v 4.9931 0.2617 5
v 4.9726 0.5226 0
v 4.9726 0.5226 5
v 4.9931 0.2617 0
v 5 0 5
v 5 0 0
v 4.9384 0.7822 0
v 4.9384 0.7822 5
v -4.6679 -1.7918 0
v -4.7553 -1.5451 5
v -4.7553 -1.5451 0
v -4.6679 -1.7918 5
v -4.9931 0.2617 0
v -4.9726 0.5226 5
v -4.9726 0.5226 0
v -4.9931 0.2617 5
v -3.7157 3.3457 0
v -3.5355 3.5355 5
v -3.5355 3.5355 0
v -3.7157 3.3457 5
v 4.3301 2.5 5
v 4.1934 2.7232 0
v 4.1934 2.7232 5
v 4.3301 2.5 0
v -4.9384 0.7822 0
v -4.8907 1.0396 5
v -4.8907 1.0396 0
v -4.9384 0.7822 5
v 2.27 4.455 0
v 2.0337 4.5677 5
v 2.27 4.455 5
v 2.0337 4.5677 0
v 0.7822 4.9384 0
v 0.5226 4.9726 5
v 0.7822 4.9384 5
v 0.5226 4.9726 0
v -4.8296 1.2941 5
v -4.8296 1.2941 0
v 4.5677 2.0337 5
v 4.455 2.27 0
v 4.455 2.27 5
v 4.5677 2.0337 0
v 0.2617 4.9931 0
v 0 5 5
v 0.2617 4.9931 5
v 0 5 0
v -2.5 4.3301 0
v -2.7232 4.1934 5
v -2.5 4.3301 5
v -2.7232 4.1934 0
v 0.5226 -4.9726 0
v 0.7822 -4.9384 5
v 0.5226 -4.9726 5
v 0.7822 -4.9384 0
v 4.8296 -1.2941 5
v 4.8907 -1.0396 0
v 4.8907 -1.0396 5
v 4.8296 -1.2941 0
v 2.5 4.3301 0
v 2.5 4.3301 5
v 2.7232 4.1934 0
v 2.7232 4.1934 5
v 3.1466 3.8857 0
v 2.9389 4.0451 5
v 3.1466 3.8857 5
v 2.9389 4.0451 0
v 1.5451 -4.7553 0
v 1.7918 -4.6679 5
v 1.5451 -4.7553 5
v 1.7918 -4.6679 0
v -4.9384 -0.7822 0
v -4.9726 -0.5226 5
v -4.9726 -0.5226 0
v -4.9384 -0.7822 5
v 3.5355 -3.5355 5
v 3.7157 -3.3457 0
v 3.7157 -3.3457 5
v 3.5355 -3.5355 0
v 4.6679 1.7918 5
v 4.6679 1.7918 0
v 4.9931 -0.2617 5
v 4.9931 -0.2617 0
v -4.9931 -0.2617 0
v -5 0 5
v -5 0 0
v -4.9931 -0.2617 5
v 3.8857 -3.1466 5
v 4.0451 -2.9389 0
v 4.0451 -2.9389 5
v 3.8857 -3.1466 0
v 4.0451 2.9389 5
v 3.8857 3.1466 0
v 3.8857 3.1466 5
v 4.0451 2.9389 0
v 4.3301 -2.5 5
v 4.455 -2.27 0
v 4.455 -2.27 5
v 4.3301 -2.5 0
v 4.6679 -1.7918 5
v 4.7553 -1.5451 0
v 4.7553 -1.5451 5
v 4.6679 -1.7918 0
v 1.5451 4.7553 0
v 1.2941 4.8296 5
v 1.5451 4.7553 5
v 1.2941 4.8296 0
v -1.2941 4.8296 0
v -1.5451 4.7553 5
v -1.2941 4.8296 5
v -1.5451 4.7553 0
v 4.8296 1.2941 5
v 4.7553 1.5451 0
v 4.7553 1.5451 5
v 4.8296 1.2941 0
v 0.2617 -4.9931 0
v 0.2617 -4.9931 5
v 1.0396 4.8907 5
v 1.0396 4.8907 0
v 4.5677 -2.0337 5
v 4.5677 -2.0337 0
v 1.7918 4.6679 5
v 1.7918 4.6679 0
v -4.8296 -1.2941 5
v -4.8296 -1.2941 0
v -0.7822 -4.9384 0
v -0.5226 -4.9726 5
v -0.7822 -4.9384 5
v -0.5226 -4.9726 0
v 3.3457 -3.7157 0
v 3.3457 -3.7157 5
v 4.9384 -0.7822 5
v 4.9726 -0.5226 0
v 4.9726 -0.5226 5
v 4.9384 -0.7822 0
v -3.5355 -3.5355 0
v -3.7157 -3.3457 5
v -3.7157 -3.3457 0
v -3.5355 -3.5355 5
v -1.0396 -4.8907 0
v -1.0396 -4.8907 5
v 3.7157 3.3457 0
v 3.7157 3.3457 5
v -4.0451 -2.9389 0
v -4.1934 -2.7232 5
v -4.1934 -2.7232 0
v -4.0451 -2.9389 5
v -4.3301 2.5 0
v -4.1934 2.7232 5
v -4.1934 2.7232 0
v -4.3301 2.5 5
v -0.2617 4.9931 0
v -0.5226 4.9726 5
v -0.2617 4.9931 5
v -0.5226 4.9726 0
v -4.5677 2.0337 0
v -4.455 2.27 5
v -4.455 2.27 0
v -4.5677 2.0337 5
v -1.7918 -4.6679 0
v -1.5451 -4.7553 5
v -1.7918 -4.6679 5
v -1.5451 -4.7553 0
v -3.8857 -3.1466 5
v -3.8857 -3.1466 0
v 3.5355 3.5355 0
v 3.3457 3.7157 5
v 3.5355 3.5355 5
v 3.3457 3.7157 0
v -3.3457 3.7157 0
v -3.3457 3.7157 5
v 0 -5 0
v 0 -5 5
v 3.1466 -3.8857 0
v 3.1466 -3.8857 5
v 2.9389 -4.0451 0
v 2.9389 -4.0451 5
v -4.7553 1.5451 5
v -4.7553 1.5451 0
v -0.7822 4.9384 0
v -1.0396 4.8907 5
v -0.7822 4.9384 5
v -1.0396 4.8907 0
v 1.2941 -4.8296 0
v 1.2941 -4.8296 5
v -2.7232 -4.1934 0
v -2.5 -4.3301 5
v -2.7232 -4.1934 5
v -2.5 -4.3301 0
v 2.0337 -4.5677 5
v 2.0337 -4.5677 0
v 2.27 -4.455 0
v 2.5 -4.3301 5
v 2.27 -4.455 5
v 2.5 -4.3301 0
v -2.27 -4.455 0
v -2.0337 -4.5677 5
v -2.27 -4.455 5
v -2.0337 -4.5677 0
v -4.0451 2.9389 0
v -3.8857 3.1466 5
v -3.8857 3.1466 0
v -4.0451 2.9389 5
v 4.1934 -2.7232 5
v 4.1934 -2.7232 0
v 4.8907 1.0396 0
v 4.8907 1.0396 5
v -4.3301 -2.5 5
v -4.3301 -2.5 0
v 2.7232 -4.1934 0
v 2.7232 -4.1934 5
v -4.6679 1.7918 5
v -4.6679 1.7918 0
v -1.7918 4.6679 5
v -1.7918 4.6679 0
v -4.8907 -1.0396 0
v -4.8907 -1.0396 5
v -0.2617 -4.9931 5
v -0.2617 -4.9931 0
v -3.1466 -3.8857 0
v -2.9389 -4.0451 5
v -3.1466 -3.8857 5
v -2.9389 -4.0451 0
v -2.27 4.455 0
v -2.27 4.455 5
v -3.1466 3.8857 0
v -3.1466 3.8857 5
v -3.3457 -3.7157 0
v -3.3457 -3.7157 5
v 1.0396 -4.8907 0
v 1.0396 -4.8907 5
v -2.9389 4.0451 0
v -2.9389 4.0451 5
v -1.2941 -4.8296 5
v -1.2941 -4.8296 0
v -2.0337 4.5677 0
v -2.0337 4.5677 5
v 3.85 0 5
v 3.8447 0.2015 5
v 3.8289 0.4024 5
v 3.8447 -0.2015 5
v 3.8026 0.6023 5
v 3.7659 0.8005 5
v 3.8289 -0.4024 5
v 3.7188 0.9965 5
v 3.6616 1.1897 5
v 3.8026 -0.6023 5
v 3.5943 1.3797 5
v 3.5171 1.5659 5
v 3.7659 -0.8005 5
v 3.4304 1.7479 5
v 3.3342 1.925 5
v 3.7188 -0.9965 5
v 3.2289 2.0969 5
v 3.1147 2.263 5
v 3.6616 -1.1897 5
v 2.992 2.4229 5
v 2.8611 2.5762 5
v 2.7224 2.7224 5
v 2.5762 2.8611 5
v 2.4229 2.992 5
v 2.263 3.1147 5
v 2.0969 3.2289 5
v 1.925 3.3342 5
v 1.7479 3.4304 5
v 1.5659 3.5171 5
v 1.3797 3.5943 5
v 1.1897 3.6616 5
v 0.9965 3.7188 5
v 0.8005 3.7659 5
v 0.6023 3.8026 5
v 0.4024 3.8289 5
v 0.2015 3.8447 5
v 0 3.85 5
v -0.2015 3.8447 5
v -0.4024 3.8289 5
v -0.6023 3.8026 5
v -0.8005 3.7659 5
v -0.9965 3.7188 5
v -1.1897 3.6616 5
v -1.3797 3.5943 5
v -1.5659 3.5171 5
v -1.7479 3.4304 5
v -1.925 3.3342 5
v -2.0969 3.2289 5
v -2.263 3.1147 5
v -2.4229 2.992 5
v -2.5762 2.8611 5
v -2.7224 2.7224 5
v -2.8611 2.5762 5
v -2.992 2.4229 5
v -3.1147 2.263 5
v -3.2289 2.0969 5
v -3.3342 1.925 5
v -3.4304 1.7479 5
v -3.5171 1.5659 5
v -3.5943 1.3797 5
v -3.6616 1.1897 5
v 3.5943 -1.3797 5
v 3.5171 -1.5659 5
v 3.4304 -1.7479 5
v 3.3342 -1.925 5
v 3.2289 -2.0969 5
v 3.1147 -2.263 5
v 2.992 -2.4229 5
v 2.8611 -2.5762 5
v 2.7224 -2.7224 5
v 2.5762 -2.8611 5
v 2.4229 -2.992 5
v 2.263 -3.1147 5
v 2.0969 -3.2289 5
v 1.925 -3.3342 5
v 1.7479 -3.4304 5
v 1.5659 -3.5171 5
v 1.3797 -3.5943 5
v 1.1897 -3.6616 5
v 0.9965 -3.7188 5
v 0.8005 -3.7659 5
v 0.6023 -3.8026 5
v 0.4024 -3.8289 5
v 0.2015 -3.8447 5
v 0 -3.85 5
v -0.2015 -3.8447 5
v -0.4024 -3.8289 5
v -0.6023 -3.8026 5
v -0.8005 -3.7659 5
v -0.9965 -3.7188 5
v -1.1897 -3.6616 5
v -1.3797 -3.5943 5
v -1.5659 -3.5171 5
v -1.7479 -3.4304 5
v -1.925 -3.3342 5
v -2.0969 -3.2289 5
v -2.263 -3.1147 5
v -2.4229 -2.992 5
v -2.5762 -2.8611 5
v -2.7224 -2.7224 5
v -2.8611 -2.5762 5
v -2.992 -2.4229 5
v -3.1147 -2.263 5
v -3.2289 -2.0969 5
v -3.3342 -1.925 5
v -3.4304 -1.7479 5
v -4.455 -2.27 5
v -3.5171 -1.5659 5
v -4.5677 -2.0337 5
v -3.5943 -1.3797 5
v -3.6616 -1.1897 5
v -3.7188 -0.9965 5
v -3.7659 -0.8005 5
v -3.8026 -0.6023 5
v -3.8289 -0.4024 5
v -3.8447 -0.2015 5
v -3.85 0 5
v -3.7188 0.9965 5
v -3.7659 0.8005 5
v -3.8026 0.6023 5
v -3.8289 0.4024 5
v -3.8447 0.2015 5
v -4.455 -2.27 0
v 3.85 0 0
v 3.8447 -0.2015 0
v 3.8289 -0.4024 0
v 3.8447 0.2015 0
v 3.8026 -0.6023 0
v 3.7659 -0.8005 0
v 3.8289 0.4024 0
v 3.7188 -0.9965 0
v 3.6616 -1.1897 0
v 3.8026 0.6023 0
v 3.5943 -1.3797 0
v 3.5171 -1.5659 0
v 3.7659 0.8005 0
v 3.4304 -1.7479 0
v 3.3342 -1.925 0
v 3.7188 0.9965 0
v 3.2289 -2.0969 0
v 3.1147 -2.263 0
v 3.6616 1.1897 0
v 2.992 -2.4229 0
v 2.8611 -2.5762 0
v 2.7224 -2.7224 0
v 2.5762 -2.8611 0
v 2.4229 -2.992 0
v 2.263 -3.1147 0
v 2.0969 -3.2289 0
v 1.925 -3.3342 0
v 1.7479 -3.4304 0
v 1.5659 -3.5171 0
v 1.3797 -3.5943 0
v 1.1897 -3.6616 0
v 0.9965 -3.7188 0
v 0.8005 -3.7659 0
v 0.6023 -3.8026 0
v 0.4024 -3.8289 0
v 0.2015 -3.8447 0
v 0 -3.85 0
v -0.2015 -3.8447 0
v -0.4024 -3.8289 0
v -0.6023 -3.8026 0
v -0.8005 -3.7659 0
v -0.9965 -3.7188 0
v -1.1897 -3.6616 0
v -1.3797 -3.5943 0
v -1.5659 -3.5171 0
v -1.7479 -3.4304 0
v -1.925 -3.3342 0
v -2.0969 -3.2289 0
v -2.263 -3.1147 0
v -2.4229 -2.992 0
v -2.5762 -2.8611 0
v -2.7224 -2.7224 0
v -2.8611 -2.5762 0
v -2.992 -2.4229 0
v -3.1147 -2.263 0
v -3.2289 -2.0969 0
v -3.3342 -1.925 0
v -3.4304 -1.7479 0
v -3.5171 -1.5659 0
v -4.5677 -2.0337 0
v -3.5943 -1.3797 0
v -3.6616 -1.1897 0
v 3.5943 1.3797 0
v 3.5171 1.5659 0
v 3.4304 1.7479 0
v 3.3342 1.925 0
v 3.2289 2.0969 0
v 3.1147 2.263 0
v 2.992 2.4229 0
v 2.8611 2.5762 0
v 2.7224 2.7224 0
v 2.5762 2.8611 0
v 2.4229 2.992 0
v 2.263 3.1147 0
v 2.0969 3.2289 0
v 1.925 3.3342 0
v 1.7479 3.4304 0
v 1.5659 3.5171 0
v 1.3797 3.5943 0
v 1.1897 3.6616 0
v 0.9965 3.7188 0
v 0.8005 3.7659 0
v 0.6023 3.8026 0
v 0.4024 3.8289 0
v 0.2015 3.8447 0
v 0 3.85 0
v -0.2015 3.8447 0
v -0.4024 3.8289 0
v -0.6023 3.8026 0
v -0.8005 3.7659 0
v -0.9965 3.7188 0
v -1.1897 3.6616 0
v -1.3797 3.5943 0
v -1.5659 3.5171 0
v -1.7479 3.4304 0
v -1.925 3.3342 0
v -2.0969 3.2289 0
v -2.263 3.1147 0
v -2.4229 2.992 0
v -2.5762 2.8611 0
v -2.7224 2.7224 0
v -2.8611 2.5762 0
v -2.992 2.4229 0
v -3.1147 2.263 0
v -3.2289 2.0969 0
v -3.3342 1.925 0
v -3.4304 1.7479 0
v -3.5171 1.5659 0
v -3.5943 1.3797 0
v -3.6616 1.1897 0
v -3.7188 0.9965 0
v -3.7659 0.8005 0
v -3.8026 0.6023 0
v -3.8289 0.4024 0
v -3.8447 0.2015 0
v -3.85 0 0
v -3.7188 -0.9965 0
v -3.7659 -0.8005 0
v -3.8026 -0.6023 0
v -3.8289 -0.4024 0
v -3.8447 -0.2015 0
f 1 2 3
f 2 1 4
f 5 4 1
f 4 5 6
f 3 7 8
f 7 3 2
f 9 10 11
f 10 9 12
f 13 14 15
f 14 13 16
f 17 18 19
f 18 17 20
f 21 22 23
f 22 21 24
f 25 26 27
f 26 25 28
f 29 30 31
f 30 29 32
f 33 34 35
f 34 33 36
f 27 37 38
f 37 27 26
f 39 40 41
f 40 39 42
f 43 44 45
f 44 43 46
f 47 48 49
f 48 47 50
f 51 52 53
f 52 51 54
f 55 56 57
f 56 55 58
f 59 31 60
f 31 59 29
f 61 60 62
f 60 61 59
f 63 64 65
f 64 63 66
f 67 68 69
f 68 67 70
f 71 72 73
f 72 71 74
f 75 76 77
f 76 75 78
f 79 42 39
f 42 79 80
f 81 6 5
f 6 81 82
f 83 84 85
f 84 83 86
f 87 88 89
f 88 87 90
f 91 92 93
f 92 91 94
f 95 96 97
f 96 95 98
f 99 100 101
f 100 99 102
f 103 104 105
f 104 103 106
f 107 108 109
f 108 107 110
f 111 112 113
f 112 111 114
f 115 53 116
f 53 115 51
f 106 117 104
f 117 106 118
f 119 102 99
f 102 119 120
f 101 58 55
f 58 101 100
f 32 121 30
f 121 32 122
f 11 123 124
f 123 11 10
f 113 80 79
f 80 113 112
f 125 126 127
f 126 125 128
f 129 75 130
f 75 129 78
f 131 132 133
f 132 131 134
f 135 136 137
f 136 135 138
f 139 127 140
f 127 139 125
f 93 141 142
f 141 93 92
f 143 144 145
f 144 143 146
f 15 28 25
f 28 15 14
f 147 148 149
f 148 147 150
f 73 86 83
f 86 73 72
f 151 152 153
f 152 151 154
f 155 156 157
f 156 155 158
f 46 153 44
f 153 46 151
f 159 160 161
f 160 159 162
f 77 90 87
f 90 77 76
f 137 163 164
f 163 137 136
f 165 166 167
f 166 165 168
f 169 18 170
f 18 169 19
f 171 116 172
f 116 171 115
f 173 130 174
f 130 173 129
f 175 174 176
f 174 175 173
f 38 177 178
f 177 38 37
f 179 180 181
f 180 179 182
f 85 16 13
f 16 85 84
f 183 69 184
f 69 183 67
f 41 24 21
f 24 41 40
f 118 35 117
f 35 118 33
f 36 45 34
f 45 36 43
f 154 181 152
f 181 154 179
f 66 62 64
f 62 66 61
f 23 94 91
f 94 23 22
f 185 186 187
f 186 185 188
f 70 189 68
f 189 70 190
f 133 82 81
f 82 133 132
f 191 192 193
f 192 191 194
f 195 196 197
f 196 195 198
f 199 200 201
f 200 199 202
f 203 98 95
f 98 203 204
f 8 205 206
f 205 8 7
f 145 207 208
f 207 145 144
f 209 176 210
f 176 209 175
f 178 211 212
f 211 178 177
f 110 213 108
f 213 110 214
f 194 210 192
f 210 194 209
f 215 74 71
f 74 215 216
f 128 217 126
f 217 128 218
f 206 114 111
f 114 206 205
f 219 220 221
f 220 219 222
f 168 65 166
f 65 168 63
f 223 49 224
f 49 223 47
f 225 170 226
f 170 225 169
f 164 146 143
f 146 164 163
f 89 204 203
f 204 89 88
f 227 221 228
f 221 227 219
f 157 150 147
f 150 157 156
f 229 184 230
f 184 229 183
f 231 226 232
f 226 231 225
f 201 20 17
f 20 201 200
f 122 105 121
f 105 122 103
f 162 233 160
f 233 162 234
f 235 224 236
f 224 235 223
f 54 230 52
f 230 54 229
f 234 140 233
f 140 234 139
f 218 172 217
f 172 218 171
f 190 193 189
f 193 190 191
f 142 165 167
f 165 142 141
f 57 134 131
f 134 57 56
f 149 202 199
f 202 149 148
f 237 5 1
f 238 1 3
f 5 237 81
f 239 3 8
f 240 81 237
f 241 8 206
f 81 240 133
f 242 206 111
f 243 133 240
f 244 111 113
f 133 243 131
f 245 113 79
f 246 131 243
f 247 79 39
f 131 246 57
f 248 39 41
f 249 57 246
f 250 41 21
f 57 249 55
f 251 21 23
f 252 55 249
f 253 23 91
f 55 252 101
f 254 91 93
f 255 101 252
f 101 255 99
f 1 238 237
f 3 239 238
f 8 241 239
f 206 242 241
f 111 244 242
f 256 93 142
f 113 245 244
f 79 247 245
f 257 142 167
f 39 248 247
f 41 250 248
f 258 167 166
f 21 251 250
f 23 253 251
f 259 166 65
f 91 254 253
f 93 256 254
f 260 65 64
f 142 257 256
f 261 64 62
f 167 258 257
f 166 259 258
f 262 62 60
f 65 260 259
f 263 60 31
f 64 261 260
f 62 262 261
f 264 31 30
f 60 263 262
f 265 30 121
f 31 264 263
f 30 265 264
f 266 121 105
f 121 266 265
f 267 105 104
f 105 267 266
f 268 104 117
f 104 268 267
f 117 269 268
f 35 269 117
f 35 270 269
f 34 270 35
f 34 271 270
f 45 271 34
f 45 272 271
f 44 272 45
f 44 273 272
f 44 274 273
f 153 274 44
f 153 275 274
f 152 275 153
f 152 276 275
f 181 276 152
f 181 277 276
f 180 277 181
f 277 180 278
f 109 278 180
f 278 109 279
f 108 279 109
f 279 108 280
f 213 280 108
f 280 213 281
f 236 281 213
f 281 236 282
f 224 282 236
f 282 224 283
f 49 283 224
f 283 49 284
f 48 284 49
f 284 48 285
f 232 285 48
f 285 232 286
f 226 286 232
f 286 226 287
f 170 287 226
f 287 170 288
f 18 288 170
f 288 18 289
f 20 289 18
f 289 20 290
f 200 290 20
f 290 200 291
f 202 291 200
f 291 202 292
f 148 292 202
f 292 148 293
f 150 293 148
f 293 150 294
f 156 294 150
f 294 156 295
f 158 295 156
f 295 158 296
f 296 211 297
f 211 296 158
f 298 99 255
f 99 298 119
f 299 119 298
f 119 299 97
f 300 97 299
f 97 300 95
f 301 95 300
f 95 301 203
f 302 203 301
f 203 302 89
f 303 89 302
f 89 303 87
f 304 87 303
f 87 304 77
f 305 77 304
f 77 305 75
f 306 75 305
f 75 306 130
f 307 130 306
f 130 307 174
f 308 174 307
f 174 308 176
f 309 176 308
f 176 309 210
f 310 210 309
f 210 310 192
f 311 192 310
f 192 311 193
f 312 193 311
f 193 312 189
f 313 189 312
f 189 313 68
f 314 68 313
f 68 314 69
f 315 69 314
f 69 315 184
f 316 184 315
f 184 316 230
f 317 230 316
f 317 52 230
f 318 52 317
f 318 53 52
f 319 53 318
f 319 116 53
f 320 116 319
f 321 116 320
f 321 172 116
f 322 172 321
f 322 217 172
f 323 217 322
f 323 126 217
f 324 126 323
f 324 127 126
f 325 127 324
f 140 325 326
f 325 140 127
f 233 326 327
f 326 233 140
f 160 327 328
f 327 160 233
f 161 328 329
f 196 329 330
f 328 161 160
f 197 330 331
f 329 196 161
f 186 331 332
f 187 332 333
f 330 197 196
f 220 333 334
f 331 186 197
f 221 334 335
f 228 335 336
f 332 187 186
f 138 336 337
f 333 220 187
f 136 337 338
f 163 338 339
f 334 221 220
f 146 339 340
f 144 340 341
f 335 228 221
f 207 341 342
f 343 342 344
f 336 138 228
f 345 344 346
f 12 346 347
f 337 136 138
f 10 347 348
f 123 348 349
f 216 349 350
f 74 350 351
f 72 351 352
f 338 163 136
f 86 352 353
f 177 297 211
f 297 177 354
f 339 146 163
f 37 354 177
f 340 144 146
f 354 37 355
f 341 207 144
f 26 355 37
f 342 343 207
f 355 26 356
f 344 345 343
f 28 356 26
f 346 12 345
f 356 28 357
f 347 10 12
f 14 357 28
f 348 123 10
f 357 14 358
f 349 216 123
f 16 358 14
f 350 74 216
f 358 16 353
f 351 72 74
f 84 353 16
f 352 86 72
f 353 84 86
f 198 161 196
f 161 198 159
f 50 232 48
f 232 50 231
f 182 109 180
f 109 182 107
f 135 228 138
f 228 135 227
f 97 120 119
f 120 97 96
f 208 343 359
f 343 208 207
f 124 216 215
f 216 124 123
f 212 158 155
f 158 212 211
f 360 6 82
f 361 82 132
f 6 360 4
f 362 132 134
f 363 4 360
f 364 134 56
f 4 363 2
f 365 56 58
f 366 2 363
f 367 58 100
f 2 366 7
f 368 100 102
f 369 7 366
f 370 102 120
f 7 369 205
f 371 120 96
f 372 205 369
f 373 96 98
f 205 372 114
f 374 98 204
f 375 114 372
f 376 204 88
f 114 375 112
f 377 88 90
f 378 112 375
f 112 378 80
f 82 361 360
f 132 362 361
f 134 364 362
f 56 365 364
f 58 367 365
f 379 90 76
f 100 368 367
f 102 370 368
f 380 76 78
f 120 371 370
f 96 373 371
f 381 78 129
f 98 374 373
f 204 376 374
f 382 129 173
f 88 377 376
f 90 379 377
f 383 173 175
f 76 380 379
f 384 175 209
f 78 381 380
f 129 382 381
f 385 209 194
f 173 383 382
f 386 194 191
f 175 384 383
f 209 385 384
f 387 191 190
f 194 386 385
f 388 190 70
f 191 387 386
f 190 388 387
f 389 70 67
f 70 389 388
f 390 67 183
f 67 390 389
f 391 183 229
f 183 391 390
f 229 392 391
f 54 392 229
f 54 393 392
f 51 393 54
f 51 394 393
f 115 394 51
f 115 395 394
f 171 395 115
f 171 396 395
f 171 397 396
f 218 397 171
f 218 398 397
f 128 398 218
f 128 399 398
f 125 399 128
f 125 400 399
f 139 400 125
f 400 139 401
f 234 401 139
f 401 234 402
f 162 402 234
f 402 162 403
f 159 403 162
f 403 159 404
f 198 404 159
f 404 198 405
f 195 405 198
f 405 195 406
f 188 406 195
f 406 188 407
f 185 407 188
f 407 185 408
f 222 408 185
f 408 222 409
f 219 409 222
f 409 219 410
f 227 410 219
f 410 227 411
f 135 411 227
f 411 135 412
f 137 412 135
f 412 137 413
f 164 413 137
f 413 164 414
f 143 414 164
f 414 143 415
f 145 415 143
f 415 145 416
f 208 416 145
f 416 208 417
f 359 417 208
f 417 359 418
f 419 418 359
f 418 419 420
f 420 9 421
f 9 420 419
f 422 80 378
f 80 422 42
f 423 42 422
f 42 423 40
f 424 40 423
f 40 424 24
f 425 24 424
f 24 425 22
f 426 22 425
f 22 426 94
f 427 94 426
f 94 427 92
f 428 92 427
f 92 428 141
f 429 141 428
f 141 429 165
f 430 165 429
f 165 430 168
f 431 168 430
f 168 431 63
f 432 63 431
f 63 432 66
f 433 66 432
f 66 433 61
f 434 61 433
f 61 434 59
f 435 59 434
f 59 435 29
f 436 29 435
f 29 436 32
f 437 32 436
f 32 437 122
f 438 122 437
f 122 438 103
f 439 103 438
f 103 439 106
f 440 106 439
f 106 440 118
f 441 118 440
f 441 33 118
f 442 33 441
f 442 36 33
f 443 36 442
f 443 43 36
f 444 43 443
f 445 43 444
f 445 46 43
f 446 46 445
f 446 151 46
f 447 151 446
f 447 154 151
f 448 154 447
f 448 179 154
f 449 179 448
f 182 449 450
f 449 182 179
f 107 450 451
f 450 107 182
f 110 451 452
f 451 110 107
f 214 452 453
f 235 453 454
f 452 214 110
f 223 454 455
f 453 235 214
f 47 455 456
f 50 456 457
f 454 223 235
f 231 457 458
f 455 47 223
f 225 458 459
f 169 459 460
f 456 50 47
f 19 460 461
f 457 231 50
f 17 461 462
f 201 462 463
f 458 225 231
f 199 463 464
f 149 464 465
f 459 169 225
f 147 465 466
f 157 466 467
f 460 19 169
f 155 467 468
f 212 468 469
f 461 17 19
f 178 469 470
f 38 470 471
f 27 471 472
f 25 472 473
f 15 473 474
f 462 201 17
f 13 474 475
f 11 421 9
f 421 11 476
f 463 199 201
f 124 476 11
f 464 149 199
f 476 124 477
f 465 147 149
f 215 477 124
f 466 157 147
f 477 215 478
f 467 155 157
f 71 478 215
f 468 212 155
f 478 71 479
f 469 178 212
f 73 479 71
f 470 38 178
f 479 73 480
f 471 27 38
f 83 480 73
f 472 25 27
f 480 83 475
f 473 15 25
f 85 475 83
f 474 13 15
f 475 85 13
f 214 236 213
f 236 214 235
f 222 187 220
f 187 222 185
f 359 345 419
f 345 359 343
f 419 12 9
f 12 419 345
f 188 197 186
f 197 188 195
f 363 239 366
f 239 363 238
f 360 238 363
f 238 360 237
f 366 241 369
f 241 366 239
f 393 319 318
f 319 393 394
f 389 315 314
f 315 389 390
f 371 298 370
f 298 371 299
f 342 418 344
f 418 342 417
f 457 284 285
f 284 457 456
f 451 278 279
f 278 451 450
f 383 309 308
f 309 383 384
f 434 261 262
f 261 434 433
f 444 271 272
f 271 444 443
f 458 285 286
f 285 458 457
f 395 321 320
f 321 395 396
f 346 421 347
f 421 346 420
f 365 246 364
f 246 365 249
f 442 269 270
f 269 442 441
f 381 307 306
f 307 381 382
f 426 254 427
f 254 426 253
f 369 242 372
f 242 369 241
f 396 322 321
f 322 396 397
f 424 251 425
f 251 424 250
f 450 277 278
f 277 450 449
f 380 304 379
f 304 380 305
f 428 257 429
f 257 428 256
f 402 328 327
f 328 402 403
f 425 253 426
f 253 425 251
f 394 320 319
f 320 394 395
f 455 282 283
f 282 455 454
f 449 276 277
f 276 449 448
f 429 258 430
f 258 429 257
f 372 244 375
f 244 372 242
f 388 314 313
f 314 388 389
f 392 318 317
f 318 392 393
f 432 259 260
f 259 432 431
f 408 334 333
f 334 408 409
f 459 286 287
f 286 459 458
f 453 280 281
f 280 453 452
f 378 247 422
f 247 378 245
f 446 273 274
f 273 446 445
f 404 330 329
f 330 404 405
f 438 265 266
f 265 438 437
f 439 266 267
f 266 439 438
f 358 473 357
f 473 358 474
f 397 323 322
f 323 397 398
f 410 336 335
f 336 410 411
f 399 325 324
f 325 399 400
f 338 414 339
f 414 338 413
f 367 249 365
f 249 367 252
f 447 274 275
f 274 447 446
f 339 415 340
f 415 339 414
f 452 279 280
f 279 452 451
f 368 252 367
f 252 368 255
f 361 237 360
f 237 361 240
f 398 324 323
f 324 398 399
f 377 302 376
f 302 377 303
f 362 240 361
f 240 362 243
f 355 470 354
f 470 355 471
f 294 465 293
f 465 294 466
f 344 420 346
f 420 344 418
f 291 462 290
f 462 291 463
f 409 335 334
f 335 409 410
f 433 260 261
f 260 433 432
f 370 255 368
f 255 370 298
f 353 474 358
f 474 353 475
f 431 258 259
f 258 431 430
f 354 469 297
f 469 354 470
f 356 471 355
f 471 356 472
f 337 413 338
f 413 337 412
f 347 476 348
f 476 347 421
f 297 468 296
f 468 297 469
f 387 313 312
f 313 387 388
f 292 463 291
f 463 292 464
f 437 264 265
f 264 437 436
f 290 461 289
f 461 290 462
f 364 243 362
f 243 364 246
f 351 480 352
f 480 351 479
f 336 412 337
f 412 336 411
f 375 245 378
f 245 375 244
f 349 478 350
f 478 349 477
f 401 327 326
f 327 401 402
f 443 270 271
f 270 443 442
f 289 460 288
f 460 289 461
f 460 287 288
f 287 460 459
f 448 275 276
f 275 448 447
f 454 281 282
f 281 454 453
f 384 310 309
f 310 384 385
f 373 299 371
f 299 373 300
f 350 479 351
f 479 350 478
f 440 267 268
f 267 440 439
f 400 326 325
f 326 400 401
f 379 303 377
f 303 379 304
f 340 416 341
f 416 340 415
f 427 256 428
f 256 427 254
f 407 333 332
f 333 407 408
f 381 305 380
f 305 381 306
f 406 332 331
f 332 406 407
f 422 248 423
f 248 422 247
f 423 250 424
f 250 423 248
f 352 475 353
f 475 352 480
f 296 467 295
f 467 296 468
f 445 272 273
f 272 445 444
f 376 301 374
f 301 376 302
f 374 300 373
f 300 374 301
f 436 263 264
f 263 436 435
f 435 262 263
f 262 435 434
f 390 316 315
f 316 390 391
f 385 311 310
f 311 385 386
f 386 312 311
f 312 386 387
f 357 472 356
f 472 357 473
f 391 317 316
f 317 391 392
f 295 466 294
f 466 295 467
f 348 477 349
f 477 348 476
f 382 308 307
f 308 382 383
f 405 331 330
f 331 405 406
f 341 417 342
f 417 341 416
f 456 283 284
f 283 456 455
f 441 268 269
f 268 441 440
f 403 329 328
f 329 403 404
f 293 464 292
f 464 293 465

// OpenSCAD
$fn = 120;

dist = 39.3;
d = 5.7;
off = 0.4;
dist_all = dist + d + off;

module stick(x)
{
    cylinder(h = x, r = d/2, center = false);
}


module main()
{
    translate([-5, -3, 0])
    {
        cube([195, 6, 2]);
    }
    for(i = [1 : 1 : 5])
    {
    translate([(i-1) * dist_all, 0, 0])
        {
            stick(2+5*i);
        }
    }
}

off_cyl = 1;

module cyl()
{
    difference(){
        cylinder(h = 5, r = 5, center = false);
        cylinder(h = 50, r = (d/2) + off_cyl, center = true);
    }
}

cyl();

/*$fn = 60;

h_draw_stick = 15;
r_draw_stick = 3.1;
r_base = 50;
shift = 5; 
h_grip = 50;
stick_r = 1.5;
a = r_base-shift;

module base(){  
cylinder(h = 5, r = r_base, center = true);
translate([r_base-shift, 0, -h_grip/2]){
    cylinder(h = 50, r = r_draw_stick, center = true);
    }
}


module draw_stick(){
    cylinder(h = 15, r = r_draw_stick, center = true);
    difference(){
        translate([-0.8, -3, (h_draw_stick/2)-2]){
            stick_holder();
        }
    }
}


module main(){
    base();
    for(i = [0 : 22.5 : 360]){
    translate([a * cos(i), a * sin(i), h_draw_stick/2]){
        rotate([0, 0, i]){
            draw_stick();
            }
        }
    
    }
}

module stick_holder(){
    a = 12;
    b = 6;
    c = 2;
    difference(){
        cube([a, b, c]);
        translate([a-stick_r, (b/2)-stick_r, -1]) cube([stick_r, stick_r, c+5]);
        }    
}

main();
*/
